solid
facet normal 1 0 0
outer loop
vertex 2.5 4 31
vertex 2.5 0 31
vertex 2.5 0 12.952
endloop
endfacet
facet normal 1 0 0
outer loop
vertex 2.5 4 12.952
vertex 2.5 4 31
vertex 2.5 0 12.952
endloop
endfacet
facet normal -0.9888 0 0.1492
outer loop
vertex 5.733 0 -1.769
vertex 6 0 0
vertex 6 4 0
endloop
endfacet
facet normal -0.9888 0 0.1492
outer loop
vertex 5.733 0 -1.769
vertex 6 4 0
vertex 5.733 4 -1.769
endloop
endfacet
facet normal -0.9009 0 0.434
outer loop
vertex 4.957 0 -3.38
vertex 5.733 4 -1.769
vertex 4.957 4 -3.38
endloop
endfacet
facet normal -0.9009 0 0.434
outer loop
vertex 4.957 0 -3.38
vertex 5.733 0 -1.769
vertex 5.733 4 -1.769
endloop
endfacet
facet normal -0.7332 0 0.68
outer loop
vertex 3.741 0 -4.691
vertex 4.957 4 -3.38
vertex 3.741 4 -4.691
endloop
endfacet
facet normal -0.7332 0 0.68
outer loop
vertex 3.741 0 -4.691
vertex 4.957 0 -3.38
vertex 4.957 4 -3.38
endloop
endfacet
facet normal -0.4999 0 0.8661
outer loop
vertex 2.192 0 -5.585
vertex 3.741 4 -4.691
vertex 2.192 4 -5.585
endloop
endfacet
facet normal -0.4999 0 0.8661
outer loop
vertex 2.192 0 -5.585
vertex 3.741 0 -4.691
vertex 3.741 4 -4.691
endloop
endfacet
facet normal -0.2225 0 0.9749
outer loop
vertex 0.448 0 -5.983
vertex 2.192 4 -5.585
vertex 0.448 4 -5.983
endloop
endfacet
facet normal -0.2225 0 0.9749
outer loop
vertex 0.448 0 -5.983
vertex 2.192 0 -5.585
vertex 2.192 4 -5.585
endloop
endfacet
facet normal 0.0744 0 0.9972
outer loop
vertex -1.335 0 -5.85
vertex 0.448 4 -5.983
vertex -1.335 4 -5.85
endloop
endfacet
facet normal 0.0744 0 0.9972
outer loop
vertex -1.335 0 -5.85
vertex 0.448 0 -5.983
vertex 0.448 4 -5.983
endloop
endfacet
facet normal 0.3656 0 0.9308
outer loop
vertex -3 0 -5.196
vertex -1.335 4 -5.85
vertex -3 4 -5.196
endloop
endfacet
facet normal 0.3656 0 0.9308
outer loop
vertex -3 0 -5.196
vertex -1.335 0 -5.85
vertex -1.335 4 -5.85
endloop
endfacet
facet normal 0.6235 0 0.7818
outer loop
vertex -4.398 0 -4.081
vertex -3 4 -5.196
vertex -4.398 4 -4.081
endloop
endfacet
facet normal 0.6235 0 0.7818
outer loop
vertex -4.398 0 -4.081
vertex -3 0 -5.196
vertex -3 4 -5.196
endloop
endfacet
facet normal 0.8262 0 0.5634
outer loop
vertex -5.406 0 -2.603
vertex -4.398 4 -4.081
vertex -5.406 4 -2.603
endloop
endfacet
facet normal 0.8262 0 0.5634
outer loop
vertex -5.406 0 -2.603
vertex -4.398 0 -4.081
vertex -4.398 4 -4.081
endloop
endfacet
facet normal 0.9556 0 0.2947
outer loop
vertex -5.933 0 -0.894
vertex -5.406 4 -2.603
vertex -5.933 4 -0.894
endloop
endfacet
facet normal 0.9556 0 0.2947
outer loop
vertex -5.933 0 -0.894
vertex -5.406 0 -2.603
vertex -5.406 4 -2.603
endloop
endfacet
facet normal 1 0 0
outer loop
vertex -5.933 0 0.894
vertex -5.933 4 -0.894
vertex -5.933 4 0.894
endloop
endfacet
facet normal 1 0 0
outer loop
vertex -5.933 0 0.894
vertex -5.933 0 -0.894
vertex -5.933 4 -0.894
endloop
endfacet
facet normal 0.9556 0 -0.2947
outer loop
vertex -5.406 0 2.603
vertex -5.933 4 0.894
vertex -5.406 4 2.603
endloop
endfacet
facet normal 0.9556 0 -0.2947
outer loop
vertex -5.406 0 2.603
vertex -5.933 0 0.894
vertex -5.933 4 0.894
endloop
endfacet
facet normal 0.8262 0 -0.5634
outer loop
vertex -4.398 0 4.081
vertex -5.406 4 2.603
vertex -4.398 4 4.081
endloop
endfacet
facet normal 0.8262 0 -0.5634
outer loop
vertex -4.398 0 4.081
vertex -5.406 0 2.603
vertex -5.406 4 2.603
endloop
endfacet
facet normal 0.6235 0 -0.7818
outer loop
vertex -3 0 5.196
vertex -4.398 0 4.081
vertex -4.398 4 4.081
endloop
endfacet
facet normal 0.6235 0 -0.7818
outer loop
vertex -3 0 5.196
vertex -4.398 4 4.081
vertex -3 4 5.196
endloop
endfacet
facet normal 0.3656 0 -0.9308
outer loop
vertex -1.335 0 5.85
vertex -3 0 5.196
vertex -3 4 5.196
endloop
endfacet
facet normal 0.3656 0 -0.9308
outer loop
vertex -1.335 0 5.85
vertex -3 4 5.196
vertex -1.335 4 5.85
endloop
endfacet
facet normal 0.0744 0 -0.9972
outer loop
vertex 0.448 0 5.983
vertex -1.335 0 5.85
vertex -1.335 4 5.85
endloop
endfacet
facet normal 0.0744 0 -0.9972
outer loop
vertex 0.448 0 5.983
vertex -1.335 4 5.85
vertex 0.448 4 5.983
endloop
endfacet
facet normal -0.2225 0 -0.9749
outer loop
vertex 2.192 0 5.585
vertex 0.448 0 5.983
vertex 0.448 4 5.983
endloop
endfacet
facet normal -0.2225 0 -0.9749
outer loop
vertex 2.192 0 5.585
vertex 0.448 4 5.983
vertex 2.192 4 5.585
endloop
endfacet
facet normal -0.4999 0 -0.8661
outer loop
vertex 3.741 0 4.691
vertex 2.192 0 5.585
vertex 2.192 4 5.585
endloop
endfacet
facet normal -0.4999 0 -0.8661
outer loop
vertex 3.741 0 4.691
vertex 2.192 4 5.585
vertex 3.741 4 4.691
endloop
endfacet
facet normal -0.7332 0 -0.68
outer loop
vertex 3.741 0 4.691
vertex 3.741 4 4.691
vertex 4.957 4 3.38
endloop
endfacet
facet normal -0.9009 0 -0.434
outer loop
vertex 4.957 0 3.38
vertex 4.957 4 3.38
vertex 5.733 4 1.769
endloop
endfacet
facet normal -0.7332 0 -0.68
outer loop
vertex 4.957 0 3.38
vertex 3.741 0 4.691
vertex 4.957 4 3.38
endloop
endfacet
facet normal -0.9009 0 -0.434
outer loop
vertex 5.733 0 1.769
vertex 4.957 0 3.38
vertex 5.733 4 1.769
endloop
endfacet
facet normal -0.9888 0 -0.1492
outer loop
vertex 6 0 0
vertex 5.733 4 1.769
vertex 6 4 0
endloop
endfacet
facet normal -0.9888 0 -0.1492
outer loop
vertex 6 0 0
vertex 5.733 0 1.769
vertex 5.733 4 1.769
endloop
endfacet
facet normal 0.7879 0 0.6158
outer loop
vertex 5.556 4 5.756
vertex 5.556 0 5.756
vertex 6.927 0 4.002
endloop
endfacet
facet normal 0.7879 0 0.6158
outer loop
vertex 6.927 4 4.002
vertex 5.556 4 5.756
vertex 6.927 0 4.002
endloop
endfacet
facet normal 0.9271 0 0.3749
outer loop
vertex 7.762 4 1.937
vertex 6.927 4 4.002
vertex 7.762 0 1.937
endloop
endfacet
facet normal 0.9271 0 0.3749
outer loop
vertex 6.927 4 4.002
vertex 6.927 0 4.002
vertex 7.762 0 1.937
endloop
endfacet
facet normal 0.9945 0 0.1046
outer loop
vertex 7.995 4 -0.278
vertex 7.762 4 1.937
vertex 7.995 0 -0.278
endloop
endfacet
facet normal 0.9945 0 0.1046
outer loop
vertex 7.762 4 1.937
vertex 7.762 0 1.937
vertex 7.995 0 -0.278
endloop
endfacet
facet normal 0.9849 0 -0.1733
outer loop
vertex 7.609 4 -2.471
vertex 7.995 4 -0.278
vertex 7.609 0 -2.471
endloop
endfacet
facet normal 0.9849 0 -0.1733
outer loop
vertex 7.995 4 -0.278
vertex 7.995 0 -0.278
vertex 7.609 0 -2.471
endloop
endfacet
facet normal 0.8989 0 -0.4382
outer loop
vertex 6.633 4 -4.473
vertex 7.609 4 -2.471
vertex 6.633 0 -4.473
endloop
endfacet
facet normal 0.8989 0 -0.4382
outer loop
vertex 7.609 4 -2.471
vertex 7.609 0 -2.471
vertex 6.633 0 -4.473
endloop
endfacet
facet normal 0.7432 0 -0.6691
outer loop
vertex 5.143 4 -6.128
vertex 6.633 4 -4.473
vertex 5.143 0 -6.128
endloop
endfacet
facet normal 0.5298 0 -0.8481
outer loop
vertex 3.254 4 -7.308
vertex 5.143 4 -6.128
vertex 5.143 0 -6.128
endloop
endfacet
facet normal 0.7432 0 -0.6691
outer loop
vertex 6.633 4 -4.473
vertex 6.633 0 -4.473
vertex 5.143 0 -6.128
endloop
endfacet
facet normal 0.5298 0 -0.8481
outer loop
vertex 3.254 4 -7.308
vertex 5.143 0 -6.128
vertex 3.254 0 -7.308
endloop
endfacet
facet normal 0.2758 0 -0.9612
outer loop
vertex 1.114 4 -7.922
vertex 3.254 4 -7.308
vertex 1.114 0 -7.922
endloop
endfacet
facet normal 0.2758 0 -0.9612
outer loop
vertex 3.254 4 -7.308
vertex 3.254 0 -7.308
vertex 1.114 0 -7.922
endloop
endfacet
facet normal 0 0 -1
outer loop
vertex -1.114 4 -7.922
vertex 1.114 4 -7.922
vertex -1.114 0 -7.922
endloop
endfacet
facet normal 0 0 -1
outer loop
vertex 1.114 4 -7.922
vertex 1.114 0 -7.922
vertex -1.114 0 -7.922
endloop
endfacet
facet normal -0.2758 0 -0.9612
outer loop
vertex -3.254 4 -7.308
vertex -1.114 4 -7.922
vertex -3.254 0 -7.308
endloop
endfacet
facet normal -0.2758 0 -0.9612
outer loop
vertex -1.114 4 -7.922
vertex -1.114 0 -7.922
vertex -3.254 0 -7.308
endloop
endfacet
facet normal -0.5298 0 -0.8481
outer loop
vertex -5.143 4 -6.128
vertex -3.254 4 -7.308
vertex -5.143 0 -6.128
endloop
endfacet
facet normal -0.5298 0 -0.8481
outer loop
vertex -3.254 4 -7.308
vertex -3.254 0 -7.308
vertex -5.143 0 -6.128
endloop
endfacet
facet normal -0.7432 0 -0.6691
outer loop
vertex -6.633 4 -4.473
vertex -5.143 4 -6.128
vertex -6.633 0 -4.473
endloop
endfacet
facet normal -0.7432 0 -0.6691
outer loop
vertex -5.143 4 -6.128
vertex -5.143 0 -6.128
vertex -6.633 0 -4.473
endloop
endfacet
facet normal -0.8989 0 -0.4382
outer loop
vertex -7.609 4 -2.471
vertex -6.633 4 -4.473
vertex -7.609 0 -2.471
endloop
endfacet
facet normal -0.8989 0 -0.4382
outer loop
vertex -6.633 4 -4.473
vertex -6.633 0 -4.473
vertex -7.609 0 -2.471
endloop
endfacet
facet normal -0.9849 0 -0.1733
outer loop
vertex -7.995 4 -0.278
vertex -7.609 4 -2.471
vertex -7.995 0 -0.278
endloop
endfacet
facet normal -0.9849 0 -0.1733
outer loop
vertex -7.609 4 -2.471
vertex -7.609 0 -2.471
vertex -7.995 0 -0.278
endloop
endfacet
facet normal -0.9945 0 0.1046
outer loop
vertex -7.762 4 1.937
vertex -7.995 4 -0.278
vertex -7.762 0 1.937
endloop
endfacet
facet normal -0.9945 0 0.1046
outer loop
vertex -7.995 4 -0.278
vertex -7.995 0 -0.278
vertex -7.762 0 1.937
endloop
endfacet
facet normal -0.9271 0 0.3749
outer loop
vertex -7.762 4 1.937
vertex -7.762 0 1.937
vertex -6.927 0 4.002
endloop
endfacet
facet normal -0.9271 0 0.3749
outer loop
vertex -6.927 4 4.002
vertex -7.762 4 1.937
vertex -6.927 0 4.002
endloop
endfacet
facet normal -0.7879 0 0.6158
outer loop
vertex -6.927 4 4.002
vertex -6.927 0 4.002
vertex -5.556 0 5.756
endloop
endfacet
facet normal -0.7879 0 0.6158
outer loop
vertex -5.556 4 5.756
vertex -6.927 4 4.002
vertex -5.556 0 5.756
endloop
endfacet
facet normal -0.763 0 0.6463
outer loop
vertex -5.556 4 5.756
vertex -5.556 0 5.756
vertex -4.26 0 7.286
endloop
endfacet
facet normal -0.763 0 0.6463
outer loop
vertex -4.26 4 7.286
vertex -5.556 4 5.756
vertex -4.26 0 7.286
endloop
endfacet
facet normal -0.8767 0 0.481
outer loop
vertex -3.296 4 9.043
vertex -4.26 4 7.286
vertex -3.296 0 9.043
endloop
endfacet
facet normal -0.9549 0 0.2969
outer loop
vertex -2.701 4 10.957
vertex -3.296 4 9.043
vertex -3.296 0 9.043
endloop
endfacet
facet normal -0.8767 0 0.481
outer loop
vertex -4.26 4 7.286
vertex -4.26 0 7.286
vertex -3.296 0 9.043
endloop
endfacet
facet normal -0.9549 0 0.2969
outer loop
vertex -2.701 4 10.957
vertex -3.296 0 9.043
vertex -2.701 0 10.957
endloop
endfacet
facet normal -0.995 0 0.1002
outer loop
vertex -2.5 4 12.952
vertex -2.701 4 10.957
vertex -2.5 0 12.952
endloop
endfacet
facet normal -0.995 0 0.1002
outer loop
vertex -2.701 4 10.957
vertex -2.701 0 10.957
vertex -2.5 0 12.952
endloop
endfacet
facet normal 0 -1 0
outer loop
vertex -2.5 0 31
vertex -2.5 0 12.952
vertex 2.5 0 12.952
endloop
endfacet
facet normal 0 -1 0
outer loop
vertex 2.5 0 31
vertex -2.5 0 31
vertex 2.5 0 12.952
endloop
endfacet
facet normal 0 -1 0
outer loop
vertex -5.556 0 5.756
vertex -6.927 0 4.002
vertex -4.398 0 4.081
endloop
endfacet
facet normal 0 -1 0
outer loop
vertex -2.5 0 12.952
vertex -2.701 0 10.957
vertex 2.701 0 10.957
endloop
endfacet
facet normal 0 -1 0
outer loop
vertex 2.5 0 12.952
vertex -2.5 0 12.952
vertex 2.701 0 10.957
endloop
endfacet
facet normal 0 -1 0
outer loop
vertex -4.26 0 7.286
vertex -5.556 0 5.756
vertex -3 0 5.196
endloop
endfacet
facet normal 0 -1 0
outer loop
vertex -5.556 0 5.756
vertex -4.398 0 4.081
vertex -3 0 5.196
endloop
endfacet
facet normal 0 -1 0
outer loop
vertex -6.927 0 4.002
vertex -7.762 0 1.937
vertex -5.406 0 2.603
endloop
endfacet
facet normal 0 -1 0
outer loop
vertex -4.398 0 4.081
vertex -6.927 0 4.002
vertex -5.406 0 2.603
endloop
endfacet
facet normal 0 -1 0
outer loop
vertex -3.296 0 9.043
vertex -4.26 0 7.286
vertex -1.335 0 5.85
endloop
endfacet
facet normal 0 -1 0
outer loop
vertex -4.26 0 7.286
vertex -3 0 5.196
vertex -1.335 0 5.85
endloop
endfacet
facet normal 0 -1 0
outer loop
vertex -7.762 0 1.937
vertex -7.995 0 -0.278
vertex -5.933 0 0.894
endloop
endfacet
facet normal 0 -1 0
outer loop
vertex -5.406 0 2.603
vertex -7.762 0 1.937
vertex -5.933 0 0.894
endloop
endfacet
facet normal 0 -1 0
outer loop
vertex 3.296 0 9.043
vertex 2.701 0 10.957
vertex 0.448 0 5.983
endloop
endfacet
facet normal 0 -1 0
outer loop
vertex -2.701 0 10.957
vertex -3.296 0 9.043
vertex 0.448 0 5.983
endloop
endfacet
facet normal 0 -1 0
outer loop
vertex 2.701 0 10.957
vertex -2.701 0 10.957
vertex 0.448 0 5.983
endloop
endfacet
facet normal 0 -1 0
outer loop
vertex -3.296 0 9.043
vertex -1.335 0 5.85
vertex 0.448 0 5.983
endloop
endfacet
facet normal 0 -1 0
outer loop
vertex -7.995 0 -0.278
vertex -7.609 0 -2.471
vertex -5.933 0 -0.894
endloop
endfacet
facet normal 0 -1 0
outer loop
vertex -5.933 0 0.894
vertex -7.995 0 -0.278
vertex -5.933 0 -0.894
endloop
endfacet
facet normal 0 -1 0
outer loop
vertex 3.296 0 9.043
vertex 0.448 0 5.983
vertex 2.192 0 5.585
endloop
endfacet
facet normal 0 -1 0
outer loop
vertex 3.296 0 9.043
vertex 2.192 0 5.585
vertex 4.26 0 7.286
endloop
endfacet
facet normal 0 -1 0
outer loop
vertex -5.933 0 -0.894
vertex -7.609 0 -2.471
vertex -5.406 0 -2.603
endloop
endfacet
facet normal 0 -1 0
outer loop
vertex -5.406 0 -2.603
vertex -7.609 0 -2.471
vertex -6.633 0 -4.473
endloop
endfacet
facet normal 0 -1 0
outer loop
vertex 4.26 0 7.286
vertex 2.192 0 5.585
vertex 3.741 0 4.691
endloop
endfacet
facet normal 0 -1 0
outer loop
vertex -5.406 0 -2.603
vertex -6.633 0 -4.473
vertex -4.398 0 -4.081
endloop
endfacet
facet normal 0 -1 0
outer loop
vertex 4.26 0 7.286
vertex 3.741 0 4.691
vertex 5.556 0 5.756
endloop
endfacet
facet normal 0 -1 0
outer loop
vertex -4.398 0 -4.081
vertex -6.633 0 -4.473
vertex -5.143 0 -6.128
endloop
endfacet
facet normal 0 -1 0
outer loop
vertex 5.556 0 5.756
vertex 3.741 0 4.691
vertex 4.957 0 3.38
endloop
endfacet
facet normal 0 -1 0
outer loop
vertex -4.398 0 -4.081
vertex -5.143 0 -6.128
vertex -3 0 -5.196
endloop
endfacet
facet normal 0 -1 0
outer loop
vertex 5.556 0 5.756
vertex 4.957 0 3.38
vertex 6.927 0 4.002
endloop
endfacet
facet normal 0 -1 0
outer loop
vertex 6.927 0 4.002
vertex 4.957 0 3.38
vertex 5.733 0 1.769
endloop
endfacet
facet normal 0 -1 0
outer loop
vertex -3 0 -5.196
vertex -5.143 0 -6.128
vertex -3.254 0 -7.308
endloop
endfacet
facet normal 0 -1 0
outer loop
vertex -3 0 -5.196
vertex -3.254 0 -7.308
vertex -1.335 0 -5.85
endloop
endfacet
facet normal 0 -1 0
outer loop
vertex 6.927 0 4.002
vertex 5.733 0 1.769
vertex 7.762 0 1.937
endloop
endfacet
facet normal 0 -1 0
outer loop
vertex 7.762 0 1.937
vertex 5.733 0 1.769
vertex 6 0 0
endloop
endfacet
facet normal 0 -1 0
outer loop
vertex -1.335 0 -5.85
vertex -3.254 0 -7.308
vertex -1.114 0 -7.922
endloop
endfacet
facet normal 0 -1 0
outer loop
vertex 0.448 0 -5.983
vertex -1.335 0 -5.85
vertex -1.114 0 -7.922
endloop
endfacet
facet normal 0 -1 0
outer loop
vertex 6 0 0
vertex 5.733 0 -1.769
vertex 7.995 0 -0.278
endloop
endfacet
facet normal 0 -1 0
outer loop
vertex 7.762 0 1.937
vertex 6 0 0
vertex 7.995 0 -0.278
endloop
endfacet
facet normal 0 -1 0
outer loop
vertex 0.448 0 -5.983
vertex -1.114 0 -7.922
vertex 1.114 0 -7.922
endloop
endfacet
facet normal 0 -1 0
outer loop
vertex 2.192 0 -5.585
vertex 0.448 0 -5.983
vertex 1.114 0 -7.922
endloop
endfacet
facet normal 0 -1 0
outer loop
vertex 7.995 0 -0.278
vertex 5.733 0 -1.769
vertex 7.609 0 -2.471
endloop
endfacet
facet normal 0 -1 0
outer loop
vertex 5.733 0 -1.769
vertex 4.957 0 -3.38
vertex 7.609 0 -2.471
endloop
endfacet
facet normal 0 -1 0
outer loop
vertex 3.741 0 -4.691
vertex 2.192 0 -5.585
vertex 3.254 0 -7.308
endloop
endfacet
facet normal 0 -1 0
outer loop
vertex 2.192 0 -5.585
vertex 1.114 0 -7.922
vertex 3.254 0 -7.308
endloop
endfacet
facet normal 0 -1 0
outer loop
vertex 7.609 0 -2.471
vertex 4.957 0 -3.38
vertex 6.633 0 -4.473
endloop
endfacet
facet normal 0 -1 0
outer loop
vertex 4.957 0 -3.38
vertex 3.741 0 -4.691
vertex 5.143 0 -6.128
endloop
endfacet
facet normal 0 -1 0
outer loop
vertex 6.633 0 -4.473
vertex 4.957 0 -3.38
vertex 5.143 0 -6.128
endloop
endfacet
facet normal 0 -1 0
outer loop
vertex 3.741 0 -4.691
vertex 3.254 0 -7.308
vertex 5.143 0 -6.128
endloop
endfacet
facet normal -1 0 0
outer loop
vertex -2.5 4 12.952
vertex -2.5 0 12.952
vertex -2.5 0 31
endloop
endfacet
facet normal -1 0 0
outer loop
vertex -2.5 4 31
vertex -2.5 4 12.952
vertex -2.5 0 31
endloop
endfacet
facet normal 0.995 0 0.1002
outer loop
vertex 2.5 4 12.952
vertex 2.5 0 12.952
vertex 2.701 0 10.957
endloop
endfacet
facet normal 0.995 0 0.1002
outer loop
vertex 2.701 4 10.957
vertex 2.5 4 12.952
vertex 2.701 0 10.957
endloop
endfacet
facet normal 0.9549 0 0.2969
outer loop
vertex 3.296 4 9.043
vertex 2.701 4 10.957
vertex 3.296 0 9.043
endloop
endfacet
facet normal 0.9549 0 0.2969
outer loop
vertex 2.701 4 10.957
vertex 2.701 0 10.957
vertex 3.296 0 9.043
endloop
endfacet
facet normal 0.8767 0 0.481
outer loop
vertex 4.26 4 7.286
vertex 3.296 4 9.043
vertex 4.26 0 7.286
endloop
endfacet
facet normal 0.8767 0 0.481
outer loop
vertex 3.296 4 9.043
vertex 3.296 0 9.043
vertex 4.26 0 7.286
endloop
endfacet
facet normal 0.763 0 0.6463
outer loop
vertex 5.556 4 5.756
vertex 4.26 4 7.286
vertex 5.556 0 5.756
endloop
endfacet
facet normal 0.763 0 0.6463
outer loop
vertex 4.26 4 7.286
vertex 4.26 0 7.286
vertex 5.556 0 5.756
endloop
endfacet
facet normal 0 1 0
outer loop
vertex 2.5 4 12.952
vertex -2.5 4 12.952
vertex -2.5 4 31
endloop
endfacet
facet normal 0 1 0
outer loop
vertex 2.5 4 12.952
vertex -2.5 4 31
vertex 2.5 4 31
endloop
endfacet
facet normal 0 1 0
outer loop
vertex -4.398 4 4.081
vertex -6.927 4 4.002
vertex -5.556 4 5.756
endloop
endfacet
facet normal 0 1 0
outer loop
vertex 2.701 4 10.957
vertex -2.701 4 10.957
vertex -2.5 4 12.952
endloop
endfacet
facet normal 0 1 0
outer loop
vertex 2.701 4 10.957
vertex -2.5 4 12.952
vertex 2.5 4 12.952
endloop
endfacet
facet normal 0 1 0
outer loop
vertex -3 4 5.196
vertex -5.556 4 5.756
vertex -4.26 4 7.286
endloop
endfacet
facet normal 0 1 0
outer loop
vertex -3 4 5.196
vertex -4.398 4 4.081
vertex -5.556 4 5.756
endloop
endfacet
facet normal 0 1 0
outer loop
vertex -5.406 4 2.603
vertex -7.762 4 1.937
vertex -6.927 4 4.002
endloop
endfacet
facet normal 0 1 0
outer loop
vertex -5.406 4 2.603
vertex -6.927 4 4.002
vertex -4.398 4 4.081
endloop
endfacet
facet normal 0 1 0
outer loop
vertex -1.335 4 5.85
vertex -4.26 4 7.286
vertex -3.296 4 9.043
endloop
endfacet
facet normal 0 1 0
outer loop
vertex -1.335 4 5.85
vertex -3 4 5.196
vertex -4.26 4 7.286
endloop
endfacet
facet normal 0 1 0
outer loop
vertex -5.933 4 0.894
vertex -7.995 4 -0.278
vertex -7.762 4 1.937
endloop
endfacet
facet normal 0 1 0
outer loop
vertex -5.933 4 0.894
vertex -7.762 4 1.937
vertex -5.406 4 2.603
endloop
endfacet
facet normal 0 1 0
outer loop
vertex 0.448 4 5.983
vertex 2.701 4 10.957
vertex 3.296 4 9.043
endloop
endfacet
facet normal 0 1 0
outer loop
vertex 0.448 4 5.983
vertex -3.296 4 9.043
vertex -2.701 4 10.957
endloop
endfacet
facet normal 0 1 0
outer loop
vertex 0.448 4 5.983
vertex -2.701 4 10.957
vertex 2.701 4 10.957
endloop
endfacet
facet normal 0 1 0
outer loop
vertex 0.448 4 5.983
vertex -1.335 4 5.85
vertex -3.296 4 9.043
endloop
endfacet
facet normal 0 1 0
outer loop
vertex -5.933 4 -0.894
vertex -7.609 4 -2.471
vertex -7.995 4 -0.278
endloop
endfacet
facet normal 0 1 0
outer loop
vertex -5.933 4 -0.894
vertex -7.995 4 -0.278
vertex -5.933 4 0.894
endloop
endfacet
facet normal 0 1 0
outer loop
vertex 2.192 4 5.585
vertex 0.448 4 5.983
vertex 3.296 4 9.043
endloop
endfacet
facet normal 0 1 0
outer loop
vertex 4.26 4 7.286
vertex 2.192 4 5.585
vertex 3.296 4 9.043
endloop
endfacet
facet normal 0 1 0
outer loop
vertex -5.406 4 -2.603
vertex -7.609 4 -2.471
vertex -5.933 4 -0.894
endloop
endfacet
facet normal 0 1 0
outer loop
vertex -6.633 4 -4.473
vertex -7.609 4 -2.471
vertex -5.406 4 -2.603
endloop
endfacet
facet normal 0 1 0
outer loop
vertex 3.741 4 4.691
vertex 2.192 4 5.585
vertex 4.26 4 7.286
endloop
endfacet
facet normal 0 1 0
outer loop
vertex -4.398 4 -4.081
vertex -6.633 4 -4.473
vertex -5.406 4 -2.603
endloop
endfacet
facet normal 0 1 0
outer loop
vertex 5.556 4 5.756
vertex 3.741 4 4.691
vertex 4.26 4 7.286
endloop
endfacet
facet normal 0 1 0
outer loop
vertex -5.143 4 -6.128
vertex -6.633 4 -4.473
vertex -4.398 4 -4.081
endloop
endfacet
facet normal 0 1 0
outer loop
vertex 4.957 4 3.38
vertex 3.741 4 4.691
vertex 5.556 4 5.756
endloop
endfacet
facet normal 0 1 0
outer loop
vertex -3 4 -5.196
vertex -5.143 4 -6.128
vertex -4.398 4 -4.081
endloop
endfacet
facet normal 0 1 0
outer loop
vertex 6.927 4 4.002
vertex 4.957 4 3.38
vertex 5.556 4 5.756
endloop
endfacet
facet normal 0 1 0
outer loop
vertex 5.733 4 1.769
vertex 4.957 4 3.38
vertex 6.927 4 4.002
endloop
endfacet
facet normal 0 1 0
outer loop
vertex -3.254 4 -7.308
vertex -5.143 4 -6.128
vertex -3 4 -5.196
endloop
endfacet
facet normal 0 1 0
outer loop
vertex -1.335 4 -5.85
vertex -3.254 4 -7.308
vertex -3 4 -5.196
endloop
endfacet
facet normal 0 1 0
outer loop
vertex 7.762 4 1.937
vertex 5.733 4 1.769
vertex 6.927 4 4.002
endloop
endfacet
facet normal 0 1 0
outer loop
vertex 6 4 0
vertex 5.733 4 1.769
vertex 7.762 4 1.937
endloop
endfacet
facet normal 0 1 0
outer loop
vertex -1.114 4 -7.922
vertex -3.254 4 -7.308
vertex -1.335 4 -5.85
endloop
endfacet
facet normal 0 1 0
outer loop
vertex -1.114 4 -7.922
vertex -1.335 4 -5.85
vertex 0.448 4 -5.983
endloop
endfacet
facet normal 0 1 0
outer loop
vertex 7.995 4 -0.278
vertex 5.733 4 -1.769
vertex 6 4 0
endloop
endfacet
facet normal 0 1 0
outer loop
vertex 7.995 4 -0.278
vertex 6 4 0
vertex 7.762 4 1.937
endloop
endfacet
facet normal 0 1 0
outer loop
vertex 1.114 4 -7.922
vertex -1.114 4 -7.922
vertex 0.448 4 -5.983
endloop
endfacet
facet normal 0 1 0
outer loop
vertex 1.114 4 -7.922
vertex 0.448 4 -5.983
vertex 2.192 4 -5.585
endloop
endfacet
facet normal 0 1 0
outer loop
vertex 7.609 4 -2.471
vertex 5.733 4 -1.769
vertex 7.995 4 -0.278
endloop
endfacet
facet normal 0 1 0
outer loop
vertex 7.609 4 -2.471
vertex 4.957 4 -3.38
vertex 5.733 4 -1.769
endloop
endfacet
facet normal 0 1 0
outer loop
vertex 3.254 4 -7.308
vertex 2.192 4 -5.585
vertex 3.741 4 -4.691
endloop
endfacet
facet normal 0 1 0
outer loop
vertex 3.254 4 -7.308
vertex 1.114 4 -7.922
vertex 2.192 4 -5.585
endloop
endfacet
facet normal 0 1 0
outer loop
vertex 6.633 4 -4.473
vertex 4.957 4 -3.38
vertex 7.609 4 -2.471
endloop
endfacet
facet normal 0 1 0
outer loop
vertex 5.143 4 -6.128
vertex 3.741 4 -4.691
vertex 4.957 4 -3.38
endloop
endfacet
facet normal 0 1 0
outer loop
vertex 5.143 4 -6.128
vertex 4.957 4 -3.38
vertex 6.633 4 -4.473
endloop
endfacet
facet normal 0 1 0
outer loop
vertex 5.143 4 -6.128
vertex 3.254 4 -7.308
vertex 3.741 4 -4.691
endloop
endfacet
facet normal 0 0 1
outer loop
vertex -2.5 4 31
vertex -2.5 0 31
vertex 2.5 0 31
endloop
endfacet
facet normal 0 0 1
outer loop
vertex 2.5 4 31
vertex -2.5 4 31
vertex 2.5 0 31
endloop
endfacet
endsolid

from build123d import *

# Parameters (mm, degrees)
SKETCH1_R           = 6
BOSS_EXTRUDE1_DEPTH = 4


with BuildPart() as part:
    # Sketch1 → Boss-Extrude1 (new body)
    with BuildSketch(Plane(origin=(0, 0, 0), x_dir=(1, 0, 0), z_dir=(0, 1, 0))):
        with BuildLine():
            Line((-2.5, -12.951833847), (-2.5, -31))
            Line((-2.5, -31), (2.5, -31))
            Line((2.5, -31), (2.5, -12.951833847))
            ThreePointArc((2.5, -12.951833847), (3.295532486, -9.043154047), (5.555555556, -5.756370599))
            ThreePointArc((5.555555556, -5.756370599), (0, 8), (-5.555555556, -5.756370599))
            ThreePointArc((-5.555555556, -5.756370599), (-3.295532486, -9.043154047), (-2.5, -12.951833847))
        make_face()
        Circle(SKETCH1_R, mode=Mode.SUBTRACT)
    extrude(amount=BOSS_EXTRUDE1_DEPTH)


solid = part.part
